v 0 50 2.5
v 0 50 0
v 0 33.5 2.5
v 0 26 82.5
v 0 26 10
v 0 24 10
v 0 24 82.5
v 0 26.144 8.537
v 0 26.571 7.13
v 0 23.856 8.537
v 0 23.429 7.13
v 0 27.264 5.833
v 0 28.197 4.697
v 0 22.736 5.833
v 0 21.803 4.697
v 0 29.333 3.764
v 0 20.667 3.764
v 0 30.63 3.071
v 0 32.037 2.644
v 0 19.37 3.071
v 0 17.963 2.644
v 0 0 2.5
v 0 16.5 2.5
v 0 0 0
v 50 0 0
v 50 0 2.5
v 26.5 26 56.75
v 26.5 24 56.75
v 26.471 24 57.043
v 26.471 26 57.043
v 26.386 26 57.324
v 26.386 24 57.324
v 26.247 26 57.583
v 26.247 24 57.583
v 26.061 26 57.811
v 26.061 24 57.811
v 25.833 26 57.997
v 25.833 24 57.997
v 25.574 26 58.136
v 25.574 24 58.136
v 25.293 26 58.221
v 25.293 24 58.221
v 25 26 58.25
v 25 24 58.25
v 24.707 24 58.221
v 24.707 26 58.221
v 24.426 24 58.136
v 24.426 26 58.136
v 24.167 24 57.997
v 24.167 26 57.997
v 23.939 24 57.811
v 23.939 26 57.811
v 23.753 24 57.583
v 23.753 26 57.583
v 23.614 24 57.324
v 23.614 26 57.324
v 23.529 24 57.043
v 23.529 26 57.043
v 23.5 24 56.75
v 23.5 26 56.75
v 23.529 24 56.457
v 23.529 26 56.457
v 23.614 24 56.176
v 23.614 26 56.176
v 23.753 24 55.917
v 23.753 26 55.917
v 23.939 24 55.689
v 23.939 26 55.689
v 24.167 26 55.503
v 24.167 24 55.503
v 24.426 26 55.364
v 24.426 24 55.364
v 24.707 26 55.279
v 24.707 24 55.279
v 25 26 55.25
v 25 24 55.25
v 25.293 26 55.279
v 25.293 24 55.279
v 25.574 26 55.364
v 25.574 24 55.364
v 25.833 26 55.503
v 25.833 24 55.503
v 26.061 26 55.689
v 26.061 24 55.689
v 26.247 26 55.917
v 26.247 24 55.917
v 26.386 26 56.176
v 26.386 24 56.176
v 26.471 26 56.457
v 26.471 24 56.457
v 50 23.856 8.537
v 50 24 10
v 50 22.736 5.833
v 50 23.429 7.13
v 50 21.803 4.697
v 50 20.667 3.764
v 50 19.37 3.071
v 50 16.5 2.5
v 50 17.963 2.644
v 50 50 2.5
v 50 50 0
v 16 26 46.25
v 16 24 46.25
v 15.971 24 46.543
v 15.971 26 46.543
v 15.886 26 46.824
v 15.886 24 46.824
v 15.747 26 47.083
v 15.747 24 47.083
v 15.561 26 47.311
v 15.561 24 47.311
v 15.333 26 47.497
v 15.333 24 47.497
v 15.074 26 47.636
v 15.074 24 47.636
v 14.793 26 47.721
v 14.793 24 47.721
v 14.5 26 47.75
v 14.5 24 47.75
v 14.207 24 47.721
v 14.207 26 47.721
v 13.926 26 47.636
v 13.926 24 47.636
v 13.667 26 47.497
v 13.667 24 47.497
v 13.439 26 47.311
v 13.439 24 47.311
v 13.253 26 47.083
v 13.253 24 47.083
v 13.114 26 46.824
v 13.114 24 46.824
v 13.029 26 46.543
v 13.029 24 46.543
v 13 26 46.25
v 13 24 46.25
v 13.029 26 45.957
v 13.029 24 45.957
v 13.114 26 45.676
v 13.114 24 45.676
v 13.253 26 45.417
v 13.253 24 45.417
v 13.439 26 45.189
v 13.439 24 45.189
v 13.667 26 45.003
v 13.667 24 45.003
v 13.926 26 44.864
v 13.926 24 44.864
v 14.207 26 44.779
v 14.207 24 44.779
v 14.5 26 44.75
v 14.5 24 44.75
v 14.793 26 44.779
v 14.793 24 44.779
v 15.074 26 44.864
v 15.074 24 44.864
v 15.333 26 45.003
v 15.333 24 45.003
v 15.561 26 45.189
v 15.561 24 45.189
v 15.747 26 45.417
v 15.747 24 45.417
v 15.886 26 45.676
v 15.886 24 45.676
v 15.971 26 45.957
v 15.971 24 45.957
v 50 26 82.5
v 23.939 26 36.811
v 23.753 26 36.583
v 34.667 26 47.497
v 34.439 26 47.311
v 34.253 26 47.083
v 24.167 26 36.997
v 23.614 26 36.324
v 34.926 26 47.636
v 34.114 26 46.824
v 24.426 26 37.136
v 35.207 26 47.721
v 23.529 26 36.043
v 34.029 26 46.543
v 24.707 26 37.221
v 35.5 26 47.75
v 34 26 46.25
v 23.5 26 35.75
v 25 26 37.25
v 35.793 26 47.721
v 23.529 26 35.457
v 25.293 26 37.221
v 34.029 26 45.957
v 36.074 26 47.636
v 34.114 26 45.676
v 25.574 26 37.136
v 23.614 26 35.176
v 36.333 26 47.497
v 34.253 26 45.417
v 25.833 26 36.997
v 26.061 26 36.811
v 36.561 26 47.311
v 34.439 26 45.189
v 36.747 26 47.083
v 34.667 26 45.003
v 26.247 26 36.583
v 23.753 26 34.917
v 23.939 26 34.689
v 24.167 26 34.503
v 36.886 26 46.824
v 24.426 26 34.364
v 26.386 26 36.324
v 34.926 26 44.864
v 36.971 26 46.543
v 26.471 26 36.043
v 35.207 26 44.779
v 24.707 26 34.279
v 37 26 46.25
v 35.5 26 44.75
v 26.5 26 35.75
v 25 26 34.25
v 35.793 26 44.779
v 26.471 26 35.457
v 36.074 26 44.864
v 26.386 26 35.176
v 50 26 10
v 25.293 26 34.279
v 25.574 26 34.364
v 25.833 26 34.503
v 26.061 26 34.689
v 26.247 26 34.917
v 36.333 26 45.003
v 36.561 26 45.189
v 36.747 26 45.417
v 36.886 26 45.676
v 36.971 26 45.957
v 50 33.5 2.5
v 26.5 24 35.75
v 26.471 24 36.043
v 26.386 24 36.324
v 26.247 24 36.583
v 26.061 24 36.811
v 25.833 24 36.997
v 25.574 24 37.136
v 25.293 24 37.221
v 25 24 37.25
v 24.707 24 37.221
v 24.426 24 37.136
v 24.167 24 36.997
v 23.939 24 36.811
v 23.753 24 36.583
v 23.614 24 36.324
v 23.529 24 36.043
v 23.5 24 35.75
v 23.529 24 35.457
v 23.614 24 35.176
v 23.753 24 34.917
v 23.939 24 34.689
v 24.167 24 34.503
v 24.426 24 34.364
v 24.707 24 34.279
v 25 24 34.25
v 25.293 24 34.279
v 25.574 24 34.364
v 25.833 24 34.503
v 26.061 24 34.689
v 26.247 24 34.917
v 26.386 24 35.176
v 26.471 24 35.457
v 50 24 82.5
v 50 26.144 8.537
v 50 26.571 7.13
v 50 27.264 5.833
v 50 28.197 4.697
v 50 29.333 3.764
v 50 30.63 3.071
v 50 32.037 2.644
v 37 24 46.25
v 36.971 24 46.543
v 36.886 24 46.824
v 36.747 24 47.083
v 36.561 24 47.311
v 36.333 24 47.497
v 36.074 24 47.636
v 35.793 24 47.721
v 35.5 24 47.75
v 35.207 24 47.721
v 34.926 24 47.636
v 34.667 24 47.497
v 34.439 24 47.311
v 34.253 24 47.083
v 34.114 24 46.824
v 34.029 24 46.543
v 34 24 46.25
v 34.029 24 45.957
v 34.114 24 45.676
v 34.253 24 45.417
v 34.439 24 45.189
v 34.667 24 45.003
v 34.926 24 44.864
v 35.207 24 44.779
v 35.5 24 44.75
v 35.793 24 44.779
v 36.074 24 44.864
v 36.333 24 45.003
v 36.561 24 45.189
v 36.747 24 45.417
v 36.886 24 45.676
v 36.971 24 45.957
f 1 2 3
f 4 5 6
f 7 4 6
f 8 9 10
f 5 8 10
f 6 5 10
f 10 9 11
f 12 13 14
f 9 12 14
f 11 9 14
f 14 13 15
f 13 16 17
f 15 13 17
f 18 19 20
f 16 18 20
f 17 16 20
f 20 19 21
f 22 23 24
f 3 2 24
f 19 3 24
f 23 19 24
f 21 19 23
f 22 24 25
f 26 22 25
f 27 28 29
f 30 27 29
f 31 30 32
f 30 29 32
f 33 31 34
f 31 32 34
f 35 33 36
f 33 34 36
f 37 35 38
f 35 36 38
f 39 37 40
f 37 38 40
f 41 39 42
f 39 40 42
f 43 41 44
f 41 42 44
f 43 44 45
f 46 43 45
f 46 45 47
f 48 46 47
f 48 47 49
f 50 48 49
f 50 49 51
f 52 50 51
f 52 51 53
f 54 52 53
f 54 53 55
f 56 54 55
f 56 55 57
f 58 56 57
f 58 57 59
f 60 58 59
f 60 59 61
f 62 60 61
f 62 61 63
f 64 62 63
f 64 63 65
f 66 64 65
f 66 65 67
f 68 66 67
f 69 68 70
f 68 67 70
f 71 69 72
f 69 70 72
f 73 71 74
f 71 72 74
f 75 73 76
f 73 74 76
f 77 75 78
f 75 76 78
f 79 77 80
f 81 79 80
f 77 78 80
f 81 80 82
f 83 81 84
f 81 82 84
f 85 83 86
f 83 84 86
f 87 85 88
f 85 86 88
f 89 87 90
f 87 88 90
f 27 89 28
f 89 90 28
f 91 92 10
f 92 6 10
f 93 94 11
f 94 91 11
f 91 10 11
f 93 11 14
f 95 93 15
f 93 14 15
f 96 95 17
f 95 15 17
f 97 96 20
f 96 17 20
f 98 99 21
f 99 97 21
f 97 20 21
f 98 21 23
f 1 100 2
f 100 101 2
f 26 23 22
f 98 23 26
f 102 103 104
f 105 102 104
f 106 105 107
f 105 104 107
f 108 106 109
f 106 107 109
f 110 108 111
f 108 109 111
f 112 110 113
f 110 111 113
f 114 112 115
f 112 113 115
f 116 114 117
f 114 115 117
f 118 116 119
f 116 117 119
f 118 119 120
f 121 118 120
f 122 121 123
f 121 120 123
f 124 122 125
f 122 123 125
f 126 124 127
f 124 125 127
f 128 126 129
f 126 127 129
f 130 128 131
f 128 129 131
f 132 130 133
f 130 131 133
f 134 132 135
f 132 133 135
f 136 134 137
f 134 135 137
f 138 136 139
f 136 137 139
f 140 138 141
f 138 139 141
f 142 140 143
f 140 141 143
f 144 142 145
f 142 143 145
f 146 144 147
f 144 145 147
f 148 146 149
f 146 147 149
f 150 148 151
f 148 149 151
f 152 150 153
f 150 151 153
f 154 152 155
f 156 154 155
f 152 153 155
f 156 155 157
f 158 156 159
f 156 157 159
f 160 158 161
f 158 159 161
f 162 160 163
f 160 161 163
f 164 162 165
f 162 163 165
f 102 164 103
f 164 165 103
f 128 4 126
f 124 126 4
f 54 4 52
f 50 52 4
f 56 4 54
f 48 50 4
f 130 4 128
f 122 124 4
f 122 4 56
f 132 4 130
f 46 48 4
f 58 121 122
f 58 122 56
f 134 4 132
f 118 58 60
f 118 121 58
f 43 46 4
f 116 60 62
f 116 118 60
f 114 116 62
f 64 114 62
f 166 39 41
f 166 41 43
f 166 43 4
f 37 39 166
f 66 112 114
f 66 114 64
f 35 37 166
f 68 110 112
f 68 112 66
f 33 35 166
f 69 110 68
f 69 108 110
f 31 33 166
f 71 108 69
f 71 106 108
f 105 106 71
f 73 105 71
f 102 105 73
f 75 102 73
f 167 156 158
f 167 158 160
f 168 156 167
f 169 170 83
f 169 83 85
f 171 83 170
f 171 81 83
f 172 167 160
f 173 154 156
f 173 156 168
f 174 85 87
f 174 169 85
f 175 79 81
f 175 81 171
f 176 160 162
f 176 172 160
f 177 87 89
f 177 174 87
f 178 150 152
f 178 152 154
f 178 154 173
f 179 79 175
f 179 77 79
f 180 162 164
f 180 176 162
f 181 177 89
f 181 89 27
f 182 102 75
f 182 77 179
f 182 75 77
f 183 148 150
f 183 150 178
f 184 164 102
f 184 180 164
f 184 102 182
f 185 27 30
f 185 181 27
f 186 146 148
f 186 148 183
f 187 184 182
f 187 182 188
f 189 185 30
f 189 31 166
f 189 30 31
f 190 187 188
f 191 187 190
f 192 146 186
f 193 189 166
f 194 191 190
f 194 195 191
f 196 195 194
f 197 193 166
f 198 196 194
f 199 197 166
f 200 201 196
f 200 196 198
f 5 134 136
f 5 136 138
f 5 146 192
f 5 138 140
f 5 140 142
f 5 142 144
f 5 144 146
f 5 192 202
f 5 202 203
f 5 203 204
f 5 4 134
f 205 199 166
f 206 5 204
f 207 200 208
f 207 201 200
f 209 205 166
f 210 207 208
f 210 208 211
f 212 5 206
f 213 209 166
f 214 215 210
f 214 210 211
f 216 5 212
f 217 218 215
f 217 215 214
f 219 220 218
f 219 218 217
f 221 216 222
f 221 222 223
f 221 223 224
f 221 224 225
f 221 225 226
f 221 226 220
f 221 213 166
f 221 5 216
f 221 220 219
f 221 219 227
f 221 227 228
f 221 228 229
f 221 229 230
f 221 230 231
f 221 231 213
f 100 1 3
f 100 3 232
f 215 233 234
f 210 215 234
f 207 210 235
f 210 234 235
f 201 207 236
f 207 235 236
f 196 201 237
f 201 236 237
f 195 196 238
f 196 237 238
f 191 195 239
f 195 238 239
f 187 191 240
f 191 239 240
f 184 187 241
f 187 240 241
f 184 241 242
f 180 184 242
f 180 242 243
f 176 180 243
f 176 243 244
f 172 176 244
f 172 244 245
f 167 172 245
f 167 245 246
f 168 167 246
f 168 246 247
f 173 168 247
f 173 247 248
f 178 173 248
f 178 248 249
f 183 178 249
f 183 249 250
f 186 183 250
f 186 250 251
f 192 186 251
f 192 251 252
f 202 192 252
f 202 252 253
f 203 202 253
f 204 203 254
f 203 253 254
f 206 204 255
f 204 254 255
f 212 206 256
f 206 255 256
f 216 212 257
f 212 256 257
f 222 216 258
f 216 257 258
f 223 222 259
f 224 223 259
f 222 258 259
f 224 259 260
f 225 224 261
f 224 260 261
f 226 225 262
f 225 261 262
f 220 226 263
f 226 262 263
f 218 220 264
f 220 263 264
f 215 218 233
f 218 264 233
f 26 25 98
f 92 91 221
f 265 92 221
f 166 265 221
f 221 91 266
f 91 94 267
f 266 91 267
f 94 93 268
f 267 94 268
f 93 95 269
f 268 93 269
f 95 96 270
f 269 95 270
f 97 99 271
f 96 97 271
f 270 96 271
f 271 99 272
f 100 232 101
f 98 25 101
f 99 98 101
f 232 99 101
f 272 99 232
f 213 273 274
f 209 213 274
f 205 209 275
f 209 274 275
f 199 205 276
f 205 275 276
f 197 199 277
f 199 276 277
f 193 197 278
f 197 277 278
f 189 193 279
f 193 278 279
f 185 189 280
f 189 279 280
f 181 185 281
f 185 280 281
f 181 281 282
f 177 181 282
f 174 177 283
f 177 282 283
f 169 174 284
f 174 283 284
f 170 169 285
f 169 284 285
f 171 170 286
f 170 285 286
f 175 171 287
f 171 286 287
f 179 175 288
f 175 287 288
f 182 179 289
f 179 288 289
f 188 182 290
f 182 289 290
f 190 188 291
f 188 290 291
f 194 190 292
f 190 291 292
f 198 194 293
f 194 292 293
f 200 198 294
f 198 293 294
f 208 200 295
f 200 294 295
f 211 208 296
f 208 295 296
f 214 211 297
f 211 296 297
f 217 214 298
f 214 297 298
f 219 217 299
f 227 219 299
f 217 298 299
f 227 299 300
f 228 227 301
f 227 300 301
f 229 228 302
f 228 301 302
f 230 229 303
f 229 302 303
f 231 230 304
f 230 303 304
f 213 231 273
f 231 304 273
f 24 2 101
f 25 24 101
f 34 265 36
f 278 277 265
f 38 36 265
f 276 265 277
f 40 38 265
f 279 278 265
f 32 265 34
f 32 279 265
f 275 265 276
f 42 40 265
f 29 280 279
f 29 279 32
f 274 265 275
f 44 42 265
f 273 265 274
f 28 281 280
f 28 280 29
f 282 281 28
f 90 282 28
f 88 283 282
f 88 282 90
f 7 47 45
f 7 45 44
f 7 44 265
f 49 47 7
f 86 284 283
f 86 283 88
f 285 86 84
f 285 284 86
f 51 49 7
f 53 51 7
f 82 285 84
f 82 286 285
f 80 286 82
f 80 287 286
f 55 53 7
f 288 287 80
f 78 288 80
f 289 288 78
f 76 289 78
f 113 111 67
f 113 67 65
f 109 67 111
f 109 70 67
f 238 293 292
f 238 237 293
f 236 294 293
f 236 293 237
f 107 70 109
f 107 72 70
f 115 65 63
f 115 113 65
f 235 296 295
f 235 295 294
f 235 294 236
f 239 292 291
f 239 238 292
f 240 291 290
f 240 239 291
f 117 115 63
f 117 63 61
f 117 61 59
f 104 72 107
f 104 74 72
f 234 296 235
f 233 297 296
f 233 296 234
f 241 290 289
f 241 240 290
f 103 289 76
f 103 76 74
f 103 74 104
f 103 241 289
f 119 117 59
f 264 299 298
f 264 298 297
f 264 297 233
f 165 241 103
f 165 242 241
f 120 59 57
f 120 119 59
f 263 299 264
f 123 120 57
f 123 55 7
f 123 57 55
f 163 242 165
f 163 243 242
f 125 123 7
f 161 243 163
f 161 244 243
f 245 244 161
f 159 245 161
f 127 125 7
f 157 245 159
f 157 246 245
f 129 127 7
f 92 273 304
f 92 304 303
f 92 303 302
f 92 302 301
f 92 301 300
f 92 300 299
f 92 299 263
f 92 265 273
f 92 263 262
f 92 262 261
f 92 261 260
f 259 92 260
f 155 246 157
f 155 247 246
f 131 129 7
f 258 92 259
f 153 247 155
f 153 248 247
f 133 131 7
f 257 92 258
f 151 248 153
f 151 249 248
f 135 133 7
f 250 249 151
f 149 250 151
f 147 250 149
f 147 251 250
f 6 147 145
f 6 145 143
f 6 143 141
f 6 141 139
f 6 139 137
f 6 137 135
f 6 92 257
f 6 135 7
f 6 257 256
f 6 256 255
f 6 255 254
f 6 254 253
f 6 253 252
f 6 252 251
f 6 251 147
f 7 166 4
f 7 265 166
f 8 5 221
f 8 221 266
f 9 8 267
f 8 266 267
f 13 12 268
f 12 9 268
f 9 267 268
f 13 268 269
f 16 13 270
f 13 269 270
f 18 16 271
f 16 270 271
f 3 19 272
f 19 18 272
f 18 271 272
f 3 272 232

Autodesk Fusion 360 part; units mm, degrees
sketch "Sketch1" plane through (0, 0, 0) normal (0, 0, 1) x (1, 0, 0)
  line L0 (0, 0) -> (50, 0)
  line L1 (50, 0) -> (50, 50)
  line L2 (50, 50) -> (0, 50)
  line L3 (0, 50) -> (0, 0)
  dimension "d3" = 50
  dimension "d4" = 50
extrude "Extrude1" add sketch "Sketch1" along normal blind 2.5
sketch "Sketch2" plane through (0, 0, 2.5) normal (0, 0, 1) x (-1, 0, 0)
  line L0 (0, -50) -> (0, 0)
  line L1 (0, 0) -> (-50, 0)
  line L2 (-50, 0) -> (-50, -50)
  line L3 (-50, -50) -> (0, -50)
  line L4 (0, -25) -> (-50, -25)
  line L5 (0, -26) -> (-50, -26)
  line L6 (-50, -26) -> (-50, -24)
  line L7 (-50, -24) -> (0, -24)
  line L8 (0, -24) -> (0, -26)
  dimension "d5" = 1
  dimension "d6" = 1
extrude "Extrude2" add sketch "Sketch2" along normal blind 80 contours L0 L2 L4 L5 L6 L8 | L0 L2 L4 L6 L7 L8
fillet "Fillet1" radius 7.5 2 edges at (25, 24, 2.5) (25, 26, 2.5)
sketch "Sketch3" plane through (0, 24, 0) normal (0, -1, 0) x (1, 0, 0)
  line L0 (0, 10) -> (50, 10)
  line L1 (50, 10) -> (50, 82.5)
  line L2 (50, 82.5) -> (0, 82.5)
  line L3 (0, 82.5) -> (0, 10)
  line L4 (0, 46.25) -> (50, 46.25)
  line L5 (25, 82.5) -> (25, 0)
  circle A0 centre (25, 56.75) radius 1.5
  circle A1 centre (14.5, 46.25) radius 1.5
  circle A2 centre (35.5, 46.25) radius 1.5
  circle A3 centre (25, 35.75) radius 1.5
  dimension "d11" = 3
  dimension "d12" = 10.5
  dimension "d13" = 3
  dimension "d14" = 10.5
extrude "Extrude3" cut sketch "Sketch3" against normal blind 3 contours L5 A3 | L5 A3 | L4 A1 | L4 A1 | L4 A2 | L4 A2 | L5 A0 | L5 A0
